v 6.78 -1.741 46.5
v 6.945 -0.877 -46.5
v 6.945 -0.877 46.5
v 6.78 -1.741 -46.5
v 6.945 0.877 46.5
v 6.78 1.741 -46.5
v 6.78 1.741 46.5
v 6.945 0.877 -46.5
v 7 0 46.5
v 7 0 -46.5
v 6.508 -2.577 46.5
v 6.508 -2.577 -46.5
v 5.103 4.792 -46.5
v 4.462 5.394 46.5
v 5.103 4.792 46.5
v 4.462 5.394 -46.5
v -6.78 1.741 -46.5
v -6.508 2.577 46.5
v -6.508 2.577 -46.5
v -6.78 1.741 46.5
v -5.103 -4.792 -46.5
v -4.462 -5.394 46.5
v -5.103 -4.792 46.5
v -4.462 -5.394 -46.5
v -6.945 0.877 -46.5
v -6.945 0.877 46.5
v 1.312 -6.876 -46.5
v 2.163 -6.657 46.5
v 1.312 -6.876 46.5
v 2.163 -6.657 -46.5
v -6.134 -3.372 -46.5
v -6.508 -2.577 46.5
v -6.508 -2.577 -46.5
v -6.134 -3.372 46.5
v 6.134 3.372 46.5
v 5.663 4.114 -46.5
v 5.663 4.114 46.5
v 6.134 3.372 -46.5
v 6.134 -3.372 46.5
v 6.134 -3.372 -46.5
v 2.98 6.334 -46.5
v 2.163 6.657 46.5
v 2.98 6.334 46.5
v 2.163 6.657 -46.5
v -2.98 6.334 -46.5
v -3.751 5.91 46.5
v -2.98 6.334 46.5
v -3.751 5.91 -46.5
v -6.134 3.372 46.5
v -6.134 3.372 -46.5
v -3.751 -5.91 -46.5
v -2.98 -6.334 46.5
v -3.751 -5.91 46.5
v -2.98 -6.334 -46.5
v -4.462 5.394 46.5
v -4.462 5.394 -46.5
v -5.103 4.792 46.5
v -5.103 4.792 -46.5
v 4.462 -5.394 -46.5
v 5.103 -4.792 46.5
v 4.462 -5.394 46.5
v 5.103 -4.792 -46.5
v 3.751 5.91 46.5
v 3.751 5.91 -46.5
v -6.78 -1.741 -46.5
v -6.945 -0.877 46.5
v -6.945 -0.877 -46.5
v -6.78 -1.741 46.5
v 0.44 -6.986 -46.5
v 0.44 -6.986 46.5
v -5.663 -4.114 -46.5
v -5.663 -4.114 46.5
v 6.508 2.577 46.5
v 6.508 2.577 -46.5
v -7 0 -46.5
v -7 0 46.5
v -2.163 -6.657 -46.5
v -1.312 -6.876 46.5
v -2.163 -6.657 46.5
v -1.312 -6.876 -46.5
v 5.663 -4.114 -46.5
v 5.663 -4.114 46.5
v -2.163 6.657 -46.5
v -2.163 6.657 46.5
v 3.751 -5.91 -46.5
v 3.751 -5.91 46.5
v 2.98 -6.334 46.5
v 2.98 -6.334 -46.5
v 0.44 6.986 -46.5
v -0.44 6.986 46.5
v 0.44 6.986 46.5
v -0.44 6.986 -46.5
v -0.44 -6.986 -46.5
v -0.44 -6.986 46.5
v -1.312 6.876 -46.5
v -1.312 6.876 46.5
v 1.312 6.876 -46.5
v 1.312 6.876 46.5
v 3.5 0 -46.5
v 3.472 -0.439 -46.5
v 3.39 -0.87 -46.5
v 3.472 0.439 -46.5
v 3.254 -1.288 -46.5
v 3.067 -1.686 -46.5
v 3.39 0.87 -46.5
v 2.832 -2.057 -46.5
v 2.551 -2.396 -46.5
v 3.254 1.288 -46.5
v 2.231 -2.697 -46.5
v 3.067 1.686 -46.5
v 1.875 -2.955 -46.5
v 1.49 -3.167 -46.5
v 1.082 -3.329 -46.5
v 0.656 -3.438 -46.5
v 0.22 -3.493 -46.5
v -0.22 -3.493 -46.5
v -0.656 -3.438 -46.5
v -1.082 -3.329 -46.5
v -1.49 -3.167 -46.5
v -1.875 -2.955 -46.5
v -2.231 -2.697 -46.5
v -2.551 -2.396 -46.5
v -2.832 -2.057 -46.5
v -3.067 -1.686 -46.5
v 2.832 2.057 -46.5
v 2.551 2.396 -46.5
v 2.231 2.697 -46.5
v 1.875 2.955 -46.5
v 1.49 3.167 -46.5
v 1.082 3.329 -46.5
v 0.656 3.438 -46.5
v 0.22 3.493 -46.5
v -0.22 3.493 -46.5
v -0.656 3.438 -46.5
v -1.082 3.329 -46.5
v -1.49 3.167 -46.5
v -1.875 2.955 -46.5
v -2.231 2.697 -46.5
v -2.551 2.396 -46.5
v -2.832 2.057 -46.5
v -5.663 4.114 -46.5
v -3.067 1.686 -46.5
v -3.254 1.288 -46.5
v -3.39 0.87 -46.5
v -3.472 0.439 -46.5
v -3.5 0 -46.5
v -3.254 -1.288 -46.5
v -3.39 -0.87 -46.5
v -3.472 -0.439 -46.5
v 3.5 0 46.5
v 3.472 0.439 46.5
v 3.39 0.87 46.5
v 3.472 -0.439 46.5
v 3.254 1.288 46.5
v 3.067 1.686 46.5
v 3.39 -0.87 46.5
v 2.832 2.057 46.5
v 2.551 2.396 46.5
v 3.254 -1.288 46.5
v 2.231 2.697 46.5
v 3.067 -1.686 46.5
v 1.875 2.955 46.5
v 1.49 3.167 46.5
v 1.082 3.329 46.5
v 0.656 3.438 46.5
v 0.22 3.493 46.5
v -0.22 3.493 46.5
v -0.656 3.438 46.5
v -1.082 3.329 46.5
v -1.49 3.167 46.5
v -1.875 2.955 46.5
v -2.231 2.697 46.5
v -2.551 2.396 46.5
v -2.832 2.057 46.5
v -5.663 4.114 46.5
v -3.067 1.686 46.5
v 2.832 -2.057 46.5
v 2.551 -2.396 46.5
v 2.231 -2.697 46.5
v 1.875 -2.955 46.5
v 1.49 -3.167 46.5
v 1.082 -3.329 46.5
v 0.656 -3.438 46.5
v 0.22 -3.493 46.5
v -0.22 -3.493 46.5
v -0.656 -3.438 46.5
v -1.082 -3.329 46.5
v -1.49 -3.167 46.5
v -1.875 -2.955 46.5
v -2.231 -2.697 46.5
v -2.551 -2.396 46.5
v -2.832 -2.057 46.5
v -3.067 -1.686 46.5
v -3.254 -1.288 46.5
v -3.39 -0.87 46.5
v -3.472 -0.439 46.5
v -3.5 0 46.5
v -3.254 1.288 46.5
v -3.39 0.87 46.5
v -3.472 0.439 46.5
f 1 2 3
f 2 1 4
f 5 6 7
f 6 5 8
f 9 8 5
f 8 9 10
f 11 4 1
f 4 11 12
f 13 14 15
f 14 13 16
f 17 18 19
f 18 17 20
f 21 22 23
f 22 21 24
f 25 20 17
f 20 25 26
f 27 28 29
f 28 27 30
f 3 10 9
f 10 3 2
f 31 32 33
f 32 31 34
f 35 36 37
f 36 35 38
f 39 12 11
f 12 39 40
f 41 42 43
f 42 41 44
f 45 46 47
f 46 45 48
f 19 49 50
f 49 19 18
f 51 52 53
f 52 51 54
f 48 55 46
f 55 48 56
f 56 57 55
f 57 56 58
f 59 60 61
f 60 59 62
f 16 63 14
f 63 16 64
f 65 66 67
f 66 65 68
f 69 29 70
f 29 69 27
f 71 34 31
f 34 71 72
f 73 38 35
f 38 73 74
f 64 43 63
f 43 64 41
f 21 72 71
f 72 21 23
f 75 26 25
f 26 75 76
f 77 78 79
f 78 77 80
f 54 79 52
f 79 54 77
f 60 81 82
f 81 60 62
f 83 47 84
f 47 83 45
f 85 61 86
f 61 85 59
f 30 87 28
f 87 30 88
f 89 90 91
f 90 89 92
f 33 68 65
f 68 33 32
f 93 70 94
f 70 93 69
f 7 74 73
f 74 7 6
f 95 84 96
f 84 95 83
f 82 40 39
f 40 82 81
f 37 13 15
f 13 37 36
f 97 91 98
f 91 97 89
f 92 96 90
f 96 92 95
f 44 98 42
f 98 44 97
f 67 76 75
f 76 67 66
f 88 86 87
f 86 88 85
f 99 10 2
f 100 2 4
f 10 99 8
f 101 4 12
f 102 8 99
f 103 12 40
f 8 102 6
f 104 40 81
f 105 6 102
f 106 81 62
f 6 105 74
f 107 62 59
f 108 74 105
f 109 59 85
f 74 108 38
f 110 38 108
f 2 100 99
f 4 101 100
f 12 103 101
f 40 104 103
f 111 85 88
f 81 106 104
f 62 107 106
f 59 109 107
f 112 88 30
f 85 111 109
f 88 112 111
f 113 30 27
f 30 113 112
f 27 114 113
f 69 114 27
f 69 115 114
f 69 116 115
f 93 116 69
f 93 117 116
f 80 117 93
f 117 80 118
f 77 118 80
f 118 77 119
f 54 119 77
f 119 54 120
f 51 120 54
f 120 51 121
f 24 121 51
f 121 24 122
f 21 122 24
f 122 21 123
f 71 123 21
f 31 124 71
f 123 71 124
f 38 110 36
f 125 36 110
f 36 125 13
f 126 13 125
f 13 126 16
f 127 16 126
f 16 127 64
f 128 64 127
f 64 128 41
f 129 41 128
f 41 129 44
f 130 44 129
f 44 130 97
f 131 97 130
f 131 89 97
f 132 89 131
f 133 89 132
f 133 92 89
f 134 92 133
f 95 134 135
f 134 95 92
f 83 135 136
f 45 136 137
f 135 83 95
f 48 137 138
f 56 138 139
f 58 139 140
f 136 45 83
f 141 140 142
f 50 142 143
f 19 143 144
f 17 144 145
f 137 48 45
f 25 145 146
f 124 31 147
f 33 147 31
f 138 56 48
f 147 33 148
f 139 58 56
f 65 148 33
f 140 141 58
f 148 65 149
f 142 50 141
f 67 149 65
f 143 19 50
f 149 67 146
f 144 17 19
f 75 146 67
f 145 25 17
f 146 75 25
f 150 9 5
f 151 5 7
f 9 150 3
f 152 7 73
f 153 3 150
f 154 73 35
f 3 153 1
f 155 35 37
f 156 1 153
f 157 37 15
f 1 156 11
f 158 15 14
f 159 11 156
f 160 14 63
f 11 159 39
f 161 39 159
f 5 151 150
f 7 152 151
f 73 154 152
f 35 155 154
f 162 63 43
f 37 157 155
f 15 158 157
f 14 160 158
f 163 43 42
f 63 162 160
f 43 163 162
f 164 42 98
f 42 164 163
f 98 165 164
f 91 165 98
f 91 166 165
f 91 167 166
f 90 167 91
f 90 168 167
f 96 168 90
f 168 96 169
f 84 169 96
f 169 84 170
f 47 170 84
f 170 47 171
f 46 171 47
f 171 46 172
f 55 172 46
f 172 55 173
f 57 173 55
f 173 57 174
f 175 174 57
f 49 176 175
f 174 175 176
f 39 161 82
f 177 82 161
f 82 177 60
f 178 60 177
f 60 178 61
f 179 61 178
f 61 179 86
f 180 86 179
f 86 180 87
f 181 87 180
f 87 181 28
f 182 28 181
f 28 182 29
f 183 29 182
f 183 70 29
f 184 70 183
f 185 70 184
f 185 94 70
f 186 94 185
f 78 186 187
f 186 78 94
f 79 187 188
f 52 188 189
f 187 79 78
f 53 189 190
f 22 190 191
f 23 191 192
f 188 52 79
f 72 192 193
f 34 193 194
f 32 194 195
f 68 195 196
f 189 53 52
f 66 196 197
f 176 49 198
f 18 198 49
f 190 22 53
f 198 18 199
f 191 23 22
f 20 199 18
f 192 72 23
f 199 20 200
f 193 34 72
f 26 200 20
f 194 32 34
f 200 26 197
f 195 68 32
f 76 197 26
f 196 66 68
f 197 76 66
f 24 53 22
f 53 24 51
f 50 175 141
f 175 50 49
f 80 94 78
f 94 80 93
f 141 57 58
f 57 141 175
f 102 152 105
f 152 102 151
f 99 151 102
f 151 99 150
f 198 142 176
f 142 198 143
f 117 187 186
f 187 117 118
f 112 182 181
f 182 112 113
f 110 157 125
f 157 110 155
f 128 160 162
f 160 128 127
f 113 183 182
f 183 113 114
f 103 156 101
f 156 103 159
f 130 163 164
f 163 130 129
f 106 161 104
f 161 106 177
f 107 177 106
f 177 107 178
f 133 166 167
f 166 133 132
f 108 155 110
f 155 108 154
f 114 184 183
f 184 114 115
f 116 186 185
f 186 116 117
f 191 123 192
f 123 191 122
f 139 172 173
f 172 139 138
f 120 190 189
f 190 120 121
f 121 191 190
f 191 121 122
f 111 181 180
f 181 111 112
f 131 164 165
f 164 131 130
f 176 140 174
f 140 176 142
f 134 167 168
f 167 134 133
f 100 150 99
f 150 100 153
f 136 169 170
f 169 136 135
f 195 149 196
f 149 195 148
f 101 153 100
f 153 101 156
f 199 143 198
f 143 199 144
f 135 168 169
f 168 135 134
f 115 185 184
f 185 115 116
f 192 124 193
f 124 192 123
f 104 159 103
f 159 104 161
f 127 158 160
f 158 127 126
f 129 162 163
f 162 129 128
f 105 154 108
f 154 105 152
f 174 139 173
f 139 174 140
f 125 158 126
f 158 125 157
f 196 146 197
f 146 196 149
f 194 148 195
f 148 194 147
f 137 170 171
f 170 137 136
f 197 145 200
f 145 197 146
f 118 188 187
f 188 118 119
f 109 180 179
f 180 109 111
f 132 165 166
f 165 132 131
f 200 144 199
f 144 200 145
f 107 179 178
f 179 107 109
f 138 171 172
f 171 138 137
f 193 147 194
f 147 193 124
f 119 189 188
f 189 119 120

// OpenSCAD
$fn = 50;


difference() {
	union() {
		translate(v = [0, 0, -46.5000000000]) {
			cylinder(h = 93, r = 7.0000000000);
		}
	}
	union() {
		translate(v = [0, 0, -100.0000000000]) {
			cylinder(h = 200, r = 3.5000000000);
		}
	}
}
